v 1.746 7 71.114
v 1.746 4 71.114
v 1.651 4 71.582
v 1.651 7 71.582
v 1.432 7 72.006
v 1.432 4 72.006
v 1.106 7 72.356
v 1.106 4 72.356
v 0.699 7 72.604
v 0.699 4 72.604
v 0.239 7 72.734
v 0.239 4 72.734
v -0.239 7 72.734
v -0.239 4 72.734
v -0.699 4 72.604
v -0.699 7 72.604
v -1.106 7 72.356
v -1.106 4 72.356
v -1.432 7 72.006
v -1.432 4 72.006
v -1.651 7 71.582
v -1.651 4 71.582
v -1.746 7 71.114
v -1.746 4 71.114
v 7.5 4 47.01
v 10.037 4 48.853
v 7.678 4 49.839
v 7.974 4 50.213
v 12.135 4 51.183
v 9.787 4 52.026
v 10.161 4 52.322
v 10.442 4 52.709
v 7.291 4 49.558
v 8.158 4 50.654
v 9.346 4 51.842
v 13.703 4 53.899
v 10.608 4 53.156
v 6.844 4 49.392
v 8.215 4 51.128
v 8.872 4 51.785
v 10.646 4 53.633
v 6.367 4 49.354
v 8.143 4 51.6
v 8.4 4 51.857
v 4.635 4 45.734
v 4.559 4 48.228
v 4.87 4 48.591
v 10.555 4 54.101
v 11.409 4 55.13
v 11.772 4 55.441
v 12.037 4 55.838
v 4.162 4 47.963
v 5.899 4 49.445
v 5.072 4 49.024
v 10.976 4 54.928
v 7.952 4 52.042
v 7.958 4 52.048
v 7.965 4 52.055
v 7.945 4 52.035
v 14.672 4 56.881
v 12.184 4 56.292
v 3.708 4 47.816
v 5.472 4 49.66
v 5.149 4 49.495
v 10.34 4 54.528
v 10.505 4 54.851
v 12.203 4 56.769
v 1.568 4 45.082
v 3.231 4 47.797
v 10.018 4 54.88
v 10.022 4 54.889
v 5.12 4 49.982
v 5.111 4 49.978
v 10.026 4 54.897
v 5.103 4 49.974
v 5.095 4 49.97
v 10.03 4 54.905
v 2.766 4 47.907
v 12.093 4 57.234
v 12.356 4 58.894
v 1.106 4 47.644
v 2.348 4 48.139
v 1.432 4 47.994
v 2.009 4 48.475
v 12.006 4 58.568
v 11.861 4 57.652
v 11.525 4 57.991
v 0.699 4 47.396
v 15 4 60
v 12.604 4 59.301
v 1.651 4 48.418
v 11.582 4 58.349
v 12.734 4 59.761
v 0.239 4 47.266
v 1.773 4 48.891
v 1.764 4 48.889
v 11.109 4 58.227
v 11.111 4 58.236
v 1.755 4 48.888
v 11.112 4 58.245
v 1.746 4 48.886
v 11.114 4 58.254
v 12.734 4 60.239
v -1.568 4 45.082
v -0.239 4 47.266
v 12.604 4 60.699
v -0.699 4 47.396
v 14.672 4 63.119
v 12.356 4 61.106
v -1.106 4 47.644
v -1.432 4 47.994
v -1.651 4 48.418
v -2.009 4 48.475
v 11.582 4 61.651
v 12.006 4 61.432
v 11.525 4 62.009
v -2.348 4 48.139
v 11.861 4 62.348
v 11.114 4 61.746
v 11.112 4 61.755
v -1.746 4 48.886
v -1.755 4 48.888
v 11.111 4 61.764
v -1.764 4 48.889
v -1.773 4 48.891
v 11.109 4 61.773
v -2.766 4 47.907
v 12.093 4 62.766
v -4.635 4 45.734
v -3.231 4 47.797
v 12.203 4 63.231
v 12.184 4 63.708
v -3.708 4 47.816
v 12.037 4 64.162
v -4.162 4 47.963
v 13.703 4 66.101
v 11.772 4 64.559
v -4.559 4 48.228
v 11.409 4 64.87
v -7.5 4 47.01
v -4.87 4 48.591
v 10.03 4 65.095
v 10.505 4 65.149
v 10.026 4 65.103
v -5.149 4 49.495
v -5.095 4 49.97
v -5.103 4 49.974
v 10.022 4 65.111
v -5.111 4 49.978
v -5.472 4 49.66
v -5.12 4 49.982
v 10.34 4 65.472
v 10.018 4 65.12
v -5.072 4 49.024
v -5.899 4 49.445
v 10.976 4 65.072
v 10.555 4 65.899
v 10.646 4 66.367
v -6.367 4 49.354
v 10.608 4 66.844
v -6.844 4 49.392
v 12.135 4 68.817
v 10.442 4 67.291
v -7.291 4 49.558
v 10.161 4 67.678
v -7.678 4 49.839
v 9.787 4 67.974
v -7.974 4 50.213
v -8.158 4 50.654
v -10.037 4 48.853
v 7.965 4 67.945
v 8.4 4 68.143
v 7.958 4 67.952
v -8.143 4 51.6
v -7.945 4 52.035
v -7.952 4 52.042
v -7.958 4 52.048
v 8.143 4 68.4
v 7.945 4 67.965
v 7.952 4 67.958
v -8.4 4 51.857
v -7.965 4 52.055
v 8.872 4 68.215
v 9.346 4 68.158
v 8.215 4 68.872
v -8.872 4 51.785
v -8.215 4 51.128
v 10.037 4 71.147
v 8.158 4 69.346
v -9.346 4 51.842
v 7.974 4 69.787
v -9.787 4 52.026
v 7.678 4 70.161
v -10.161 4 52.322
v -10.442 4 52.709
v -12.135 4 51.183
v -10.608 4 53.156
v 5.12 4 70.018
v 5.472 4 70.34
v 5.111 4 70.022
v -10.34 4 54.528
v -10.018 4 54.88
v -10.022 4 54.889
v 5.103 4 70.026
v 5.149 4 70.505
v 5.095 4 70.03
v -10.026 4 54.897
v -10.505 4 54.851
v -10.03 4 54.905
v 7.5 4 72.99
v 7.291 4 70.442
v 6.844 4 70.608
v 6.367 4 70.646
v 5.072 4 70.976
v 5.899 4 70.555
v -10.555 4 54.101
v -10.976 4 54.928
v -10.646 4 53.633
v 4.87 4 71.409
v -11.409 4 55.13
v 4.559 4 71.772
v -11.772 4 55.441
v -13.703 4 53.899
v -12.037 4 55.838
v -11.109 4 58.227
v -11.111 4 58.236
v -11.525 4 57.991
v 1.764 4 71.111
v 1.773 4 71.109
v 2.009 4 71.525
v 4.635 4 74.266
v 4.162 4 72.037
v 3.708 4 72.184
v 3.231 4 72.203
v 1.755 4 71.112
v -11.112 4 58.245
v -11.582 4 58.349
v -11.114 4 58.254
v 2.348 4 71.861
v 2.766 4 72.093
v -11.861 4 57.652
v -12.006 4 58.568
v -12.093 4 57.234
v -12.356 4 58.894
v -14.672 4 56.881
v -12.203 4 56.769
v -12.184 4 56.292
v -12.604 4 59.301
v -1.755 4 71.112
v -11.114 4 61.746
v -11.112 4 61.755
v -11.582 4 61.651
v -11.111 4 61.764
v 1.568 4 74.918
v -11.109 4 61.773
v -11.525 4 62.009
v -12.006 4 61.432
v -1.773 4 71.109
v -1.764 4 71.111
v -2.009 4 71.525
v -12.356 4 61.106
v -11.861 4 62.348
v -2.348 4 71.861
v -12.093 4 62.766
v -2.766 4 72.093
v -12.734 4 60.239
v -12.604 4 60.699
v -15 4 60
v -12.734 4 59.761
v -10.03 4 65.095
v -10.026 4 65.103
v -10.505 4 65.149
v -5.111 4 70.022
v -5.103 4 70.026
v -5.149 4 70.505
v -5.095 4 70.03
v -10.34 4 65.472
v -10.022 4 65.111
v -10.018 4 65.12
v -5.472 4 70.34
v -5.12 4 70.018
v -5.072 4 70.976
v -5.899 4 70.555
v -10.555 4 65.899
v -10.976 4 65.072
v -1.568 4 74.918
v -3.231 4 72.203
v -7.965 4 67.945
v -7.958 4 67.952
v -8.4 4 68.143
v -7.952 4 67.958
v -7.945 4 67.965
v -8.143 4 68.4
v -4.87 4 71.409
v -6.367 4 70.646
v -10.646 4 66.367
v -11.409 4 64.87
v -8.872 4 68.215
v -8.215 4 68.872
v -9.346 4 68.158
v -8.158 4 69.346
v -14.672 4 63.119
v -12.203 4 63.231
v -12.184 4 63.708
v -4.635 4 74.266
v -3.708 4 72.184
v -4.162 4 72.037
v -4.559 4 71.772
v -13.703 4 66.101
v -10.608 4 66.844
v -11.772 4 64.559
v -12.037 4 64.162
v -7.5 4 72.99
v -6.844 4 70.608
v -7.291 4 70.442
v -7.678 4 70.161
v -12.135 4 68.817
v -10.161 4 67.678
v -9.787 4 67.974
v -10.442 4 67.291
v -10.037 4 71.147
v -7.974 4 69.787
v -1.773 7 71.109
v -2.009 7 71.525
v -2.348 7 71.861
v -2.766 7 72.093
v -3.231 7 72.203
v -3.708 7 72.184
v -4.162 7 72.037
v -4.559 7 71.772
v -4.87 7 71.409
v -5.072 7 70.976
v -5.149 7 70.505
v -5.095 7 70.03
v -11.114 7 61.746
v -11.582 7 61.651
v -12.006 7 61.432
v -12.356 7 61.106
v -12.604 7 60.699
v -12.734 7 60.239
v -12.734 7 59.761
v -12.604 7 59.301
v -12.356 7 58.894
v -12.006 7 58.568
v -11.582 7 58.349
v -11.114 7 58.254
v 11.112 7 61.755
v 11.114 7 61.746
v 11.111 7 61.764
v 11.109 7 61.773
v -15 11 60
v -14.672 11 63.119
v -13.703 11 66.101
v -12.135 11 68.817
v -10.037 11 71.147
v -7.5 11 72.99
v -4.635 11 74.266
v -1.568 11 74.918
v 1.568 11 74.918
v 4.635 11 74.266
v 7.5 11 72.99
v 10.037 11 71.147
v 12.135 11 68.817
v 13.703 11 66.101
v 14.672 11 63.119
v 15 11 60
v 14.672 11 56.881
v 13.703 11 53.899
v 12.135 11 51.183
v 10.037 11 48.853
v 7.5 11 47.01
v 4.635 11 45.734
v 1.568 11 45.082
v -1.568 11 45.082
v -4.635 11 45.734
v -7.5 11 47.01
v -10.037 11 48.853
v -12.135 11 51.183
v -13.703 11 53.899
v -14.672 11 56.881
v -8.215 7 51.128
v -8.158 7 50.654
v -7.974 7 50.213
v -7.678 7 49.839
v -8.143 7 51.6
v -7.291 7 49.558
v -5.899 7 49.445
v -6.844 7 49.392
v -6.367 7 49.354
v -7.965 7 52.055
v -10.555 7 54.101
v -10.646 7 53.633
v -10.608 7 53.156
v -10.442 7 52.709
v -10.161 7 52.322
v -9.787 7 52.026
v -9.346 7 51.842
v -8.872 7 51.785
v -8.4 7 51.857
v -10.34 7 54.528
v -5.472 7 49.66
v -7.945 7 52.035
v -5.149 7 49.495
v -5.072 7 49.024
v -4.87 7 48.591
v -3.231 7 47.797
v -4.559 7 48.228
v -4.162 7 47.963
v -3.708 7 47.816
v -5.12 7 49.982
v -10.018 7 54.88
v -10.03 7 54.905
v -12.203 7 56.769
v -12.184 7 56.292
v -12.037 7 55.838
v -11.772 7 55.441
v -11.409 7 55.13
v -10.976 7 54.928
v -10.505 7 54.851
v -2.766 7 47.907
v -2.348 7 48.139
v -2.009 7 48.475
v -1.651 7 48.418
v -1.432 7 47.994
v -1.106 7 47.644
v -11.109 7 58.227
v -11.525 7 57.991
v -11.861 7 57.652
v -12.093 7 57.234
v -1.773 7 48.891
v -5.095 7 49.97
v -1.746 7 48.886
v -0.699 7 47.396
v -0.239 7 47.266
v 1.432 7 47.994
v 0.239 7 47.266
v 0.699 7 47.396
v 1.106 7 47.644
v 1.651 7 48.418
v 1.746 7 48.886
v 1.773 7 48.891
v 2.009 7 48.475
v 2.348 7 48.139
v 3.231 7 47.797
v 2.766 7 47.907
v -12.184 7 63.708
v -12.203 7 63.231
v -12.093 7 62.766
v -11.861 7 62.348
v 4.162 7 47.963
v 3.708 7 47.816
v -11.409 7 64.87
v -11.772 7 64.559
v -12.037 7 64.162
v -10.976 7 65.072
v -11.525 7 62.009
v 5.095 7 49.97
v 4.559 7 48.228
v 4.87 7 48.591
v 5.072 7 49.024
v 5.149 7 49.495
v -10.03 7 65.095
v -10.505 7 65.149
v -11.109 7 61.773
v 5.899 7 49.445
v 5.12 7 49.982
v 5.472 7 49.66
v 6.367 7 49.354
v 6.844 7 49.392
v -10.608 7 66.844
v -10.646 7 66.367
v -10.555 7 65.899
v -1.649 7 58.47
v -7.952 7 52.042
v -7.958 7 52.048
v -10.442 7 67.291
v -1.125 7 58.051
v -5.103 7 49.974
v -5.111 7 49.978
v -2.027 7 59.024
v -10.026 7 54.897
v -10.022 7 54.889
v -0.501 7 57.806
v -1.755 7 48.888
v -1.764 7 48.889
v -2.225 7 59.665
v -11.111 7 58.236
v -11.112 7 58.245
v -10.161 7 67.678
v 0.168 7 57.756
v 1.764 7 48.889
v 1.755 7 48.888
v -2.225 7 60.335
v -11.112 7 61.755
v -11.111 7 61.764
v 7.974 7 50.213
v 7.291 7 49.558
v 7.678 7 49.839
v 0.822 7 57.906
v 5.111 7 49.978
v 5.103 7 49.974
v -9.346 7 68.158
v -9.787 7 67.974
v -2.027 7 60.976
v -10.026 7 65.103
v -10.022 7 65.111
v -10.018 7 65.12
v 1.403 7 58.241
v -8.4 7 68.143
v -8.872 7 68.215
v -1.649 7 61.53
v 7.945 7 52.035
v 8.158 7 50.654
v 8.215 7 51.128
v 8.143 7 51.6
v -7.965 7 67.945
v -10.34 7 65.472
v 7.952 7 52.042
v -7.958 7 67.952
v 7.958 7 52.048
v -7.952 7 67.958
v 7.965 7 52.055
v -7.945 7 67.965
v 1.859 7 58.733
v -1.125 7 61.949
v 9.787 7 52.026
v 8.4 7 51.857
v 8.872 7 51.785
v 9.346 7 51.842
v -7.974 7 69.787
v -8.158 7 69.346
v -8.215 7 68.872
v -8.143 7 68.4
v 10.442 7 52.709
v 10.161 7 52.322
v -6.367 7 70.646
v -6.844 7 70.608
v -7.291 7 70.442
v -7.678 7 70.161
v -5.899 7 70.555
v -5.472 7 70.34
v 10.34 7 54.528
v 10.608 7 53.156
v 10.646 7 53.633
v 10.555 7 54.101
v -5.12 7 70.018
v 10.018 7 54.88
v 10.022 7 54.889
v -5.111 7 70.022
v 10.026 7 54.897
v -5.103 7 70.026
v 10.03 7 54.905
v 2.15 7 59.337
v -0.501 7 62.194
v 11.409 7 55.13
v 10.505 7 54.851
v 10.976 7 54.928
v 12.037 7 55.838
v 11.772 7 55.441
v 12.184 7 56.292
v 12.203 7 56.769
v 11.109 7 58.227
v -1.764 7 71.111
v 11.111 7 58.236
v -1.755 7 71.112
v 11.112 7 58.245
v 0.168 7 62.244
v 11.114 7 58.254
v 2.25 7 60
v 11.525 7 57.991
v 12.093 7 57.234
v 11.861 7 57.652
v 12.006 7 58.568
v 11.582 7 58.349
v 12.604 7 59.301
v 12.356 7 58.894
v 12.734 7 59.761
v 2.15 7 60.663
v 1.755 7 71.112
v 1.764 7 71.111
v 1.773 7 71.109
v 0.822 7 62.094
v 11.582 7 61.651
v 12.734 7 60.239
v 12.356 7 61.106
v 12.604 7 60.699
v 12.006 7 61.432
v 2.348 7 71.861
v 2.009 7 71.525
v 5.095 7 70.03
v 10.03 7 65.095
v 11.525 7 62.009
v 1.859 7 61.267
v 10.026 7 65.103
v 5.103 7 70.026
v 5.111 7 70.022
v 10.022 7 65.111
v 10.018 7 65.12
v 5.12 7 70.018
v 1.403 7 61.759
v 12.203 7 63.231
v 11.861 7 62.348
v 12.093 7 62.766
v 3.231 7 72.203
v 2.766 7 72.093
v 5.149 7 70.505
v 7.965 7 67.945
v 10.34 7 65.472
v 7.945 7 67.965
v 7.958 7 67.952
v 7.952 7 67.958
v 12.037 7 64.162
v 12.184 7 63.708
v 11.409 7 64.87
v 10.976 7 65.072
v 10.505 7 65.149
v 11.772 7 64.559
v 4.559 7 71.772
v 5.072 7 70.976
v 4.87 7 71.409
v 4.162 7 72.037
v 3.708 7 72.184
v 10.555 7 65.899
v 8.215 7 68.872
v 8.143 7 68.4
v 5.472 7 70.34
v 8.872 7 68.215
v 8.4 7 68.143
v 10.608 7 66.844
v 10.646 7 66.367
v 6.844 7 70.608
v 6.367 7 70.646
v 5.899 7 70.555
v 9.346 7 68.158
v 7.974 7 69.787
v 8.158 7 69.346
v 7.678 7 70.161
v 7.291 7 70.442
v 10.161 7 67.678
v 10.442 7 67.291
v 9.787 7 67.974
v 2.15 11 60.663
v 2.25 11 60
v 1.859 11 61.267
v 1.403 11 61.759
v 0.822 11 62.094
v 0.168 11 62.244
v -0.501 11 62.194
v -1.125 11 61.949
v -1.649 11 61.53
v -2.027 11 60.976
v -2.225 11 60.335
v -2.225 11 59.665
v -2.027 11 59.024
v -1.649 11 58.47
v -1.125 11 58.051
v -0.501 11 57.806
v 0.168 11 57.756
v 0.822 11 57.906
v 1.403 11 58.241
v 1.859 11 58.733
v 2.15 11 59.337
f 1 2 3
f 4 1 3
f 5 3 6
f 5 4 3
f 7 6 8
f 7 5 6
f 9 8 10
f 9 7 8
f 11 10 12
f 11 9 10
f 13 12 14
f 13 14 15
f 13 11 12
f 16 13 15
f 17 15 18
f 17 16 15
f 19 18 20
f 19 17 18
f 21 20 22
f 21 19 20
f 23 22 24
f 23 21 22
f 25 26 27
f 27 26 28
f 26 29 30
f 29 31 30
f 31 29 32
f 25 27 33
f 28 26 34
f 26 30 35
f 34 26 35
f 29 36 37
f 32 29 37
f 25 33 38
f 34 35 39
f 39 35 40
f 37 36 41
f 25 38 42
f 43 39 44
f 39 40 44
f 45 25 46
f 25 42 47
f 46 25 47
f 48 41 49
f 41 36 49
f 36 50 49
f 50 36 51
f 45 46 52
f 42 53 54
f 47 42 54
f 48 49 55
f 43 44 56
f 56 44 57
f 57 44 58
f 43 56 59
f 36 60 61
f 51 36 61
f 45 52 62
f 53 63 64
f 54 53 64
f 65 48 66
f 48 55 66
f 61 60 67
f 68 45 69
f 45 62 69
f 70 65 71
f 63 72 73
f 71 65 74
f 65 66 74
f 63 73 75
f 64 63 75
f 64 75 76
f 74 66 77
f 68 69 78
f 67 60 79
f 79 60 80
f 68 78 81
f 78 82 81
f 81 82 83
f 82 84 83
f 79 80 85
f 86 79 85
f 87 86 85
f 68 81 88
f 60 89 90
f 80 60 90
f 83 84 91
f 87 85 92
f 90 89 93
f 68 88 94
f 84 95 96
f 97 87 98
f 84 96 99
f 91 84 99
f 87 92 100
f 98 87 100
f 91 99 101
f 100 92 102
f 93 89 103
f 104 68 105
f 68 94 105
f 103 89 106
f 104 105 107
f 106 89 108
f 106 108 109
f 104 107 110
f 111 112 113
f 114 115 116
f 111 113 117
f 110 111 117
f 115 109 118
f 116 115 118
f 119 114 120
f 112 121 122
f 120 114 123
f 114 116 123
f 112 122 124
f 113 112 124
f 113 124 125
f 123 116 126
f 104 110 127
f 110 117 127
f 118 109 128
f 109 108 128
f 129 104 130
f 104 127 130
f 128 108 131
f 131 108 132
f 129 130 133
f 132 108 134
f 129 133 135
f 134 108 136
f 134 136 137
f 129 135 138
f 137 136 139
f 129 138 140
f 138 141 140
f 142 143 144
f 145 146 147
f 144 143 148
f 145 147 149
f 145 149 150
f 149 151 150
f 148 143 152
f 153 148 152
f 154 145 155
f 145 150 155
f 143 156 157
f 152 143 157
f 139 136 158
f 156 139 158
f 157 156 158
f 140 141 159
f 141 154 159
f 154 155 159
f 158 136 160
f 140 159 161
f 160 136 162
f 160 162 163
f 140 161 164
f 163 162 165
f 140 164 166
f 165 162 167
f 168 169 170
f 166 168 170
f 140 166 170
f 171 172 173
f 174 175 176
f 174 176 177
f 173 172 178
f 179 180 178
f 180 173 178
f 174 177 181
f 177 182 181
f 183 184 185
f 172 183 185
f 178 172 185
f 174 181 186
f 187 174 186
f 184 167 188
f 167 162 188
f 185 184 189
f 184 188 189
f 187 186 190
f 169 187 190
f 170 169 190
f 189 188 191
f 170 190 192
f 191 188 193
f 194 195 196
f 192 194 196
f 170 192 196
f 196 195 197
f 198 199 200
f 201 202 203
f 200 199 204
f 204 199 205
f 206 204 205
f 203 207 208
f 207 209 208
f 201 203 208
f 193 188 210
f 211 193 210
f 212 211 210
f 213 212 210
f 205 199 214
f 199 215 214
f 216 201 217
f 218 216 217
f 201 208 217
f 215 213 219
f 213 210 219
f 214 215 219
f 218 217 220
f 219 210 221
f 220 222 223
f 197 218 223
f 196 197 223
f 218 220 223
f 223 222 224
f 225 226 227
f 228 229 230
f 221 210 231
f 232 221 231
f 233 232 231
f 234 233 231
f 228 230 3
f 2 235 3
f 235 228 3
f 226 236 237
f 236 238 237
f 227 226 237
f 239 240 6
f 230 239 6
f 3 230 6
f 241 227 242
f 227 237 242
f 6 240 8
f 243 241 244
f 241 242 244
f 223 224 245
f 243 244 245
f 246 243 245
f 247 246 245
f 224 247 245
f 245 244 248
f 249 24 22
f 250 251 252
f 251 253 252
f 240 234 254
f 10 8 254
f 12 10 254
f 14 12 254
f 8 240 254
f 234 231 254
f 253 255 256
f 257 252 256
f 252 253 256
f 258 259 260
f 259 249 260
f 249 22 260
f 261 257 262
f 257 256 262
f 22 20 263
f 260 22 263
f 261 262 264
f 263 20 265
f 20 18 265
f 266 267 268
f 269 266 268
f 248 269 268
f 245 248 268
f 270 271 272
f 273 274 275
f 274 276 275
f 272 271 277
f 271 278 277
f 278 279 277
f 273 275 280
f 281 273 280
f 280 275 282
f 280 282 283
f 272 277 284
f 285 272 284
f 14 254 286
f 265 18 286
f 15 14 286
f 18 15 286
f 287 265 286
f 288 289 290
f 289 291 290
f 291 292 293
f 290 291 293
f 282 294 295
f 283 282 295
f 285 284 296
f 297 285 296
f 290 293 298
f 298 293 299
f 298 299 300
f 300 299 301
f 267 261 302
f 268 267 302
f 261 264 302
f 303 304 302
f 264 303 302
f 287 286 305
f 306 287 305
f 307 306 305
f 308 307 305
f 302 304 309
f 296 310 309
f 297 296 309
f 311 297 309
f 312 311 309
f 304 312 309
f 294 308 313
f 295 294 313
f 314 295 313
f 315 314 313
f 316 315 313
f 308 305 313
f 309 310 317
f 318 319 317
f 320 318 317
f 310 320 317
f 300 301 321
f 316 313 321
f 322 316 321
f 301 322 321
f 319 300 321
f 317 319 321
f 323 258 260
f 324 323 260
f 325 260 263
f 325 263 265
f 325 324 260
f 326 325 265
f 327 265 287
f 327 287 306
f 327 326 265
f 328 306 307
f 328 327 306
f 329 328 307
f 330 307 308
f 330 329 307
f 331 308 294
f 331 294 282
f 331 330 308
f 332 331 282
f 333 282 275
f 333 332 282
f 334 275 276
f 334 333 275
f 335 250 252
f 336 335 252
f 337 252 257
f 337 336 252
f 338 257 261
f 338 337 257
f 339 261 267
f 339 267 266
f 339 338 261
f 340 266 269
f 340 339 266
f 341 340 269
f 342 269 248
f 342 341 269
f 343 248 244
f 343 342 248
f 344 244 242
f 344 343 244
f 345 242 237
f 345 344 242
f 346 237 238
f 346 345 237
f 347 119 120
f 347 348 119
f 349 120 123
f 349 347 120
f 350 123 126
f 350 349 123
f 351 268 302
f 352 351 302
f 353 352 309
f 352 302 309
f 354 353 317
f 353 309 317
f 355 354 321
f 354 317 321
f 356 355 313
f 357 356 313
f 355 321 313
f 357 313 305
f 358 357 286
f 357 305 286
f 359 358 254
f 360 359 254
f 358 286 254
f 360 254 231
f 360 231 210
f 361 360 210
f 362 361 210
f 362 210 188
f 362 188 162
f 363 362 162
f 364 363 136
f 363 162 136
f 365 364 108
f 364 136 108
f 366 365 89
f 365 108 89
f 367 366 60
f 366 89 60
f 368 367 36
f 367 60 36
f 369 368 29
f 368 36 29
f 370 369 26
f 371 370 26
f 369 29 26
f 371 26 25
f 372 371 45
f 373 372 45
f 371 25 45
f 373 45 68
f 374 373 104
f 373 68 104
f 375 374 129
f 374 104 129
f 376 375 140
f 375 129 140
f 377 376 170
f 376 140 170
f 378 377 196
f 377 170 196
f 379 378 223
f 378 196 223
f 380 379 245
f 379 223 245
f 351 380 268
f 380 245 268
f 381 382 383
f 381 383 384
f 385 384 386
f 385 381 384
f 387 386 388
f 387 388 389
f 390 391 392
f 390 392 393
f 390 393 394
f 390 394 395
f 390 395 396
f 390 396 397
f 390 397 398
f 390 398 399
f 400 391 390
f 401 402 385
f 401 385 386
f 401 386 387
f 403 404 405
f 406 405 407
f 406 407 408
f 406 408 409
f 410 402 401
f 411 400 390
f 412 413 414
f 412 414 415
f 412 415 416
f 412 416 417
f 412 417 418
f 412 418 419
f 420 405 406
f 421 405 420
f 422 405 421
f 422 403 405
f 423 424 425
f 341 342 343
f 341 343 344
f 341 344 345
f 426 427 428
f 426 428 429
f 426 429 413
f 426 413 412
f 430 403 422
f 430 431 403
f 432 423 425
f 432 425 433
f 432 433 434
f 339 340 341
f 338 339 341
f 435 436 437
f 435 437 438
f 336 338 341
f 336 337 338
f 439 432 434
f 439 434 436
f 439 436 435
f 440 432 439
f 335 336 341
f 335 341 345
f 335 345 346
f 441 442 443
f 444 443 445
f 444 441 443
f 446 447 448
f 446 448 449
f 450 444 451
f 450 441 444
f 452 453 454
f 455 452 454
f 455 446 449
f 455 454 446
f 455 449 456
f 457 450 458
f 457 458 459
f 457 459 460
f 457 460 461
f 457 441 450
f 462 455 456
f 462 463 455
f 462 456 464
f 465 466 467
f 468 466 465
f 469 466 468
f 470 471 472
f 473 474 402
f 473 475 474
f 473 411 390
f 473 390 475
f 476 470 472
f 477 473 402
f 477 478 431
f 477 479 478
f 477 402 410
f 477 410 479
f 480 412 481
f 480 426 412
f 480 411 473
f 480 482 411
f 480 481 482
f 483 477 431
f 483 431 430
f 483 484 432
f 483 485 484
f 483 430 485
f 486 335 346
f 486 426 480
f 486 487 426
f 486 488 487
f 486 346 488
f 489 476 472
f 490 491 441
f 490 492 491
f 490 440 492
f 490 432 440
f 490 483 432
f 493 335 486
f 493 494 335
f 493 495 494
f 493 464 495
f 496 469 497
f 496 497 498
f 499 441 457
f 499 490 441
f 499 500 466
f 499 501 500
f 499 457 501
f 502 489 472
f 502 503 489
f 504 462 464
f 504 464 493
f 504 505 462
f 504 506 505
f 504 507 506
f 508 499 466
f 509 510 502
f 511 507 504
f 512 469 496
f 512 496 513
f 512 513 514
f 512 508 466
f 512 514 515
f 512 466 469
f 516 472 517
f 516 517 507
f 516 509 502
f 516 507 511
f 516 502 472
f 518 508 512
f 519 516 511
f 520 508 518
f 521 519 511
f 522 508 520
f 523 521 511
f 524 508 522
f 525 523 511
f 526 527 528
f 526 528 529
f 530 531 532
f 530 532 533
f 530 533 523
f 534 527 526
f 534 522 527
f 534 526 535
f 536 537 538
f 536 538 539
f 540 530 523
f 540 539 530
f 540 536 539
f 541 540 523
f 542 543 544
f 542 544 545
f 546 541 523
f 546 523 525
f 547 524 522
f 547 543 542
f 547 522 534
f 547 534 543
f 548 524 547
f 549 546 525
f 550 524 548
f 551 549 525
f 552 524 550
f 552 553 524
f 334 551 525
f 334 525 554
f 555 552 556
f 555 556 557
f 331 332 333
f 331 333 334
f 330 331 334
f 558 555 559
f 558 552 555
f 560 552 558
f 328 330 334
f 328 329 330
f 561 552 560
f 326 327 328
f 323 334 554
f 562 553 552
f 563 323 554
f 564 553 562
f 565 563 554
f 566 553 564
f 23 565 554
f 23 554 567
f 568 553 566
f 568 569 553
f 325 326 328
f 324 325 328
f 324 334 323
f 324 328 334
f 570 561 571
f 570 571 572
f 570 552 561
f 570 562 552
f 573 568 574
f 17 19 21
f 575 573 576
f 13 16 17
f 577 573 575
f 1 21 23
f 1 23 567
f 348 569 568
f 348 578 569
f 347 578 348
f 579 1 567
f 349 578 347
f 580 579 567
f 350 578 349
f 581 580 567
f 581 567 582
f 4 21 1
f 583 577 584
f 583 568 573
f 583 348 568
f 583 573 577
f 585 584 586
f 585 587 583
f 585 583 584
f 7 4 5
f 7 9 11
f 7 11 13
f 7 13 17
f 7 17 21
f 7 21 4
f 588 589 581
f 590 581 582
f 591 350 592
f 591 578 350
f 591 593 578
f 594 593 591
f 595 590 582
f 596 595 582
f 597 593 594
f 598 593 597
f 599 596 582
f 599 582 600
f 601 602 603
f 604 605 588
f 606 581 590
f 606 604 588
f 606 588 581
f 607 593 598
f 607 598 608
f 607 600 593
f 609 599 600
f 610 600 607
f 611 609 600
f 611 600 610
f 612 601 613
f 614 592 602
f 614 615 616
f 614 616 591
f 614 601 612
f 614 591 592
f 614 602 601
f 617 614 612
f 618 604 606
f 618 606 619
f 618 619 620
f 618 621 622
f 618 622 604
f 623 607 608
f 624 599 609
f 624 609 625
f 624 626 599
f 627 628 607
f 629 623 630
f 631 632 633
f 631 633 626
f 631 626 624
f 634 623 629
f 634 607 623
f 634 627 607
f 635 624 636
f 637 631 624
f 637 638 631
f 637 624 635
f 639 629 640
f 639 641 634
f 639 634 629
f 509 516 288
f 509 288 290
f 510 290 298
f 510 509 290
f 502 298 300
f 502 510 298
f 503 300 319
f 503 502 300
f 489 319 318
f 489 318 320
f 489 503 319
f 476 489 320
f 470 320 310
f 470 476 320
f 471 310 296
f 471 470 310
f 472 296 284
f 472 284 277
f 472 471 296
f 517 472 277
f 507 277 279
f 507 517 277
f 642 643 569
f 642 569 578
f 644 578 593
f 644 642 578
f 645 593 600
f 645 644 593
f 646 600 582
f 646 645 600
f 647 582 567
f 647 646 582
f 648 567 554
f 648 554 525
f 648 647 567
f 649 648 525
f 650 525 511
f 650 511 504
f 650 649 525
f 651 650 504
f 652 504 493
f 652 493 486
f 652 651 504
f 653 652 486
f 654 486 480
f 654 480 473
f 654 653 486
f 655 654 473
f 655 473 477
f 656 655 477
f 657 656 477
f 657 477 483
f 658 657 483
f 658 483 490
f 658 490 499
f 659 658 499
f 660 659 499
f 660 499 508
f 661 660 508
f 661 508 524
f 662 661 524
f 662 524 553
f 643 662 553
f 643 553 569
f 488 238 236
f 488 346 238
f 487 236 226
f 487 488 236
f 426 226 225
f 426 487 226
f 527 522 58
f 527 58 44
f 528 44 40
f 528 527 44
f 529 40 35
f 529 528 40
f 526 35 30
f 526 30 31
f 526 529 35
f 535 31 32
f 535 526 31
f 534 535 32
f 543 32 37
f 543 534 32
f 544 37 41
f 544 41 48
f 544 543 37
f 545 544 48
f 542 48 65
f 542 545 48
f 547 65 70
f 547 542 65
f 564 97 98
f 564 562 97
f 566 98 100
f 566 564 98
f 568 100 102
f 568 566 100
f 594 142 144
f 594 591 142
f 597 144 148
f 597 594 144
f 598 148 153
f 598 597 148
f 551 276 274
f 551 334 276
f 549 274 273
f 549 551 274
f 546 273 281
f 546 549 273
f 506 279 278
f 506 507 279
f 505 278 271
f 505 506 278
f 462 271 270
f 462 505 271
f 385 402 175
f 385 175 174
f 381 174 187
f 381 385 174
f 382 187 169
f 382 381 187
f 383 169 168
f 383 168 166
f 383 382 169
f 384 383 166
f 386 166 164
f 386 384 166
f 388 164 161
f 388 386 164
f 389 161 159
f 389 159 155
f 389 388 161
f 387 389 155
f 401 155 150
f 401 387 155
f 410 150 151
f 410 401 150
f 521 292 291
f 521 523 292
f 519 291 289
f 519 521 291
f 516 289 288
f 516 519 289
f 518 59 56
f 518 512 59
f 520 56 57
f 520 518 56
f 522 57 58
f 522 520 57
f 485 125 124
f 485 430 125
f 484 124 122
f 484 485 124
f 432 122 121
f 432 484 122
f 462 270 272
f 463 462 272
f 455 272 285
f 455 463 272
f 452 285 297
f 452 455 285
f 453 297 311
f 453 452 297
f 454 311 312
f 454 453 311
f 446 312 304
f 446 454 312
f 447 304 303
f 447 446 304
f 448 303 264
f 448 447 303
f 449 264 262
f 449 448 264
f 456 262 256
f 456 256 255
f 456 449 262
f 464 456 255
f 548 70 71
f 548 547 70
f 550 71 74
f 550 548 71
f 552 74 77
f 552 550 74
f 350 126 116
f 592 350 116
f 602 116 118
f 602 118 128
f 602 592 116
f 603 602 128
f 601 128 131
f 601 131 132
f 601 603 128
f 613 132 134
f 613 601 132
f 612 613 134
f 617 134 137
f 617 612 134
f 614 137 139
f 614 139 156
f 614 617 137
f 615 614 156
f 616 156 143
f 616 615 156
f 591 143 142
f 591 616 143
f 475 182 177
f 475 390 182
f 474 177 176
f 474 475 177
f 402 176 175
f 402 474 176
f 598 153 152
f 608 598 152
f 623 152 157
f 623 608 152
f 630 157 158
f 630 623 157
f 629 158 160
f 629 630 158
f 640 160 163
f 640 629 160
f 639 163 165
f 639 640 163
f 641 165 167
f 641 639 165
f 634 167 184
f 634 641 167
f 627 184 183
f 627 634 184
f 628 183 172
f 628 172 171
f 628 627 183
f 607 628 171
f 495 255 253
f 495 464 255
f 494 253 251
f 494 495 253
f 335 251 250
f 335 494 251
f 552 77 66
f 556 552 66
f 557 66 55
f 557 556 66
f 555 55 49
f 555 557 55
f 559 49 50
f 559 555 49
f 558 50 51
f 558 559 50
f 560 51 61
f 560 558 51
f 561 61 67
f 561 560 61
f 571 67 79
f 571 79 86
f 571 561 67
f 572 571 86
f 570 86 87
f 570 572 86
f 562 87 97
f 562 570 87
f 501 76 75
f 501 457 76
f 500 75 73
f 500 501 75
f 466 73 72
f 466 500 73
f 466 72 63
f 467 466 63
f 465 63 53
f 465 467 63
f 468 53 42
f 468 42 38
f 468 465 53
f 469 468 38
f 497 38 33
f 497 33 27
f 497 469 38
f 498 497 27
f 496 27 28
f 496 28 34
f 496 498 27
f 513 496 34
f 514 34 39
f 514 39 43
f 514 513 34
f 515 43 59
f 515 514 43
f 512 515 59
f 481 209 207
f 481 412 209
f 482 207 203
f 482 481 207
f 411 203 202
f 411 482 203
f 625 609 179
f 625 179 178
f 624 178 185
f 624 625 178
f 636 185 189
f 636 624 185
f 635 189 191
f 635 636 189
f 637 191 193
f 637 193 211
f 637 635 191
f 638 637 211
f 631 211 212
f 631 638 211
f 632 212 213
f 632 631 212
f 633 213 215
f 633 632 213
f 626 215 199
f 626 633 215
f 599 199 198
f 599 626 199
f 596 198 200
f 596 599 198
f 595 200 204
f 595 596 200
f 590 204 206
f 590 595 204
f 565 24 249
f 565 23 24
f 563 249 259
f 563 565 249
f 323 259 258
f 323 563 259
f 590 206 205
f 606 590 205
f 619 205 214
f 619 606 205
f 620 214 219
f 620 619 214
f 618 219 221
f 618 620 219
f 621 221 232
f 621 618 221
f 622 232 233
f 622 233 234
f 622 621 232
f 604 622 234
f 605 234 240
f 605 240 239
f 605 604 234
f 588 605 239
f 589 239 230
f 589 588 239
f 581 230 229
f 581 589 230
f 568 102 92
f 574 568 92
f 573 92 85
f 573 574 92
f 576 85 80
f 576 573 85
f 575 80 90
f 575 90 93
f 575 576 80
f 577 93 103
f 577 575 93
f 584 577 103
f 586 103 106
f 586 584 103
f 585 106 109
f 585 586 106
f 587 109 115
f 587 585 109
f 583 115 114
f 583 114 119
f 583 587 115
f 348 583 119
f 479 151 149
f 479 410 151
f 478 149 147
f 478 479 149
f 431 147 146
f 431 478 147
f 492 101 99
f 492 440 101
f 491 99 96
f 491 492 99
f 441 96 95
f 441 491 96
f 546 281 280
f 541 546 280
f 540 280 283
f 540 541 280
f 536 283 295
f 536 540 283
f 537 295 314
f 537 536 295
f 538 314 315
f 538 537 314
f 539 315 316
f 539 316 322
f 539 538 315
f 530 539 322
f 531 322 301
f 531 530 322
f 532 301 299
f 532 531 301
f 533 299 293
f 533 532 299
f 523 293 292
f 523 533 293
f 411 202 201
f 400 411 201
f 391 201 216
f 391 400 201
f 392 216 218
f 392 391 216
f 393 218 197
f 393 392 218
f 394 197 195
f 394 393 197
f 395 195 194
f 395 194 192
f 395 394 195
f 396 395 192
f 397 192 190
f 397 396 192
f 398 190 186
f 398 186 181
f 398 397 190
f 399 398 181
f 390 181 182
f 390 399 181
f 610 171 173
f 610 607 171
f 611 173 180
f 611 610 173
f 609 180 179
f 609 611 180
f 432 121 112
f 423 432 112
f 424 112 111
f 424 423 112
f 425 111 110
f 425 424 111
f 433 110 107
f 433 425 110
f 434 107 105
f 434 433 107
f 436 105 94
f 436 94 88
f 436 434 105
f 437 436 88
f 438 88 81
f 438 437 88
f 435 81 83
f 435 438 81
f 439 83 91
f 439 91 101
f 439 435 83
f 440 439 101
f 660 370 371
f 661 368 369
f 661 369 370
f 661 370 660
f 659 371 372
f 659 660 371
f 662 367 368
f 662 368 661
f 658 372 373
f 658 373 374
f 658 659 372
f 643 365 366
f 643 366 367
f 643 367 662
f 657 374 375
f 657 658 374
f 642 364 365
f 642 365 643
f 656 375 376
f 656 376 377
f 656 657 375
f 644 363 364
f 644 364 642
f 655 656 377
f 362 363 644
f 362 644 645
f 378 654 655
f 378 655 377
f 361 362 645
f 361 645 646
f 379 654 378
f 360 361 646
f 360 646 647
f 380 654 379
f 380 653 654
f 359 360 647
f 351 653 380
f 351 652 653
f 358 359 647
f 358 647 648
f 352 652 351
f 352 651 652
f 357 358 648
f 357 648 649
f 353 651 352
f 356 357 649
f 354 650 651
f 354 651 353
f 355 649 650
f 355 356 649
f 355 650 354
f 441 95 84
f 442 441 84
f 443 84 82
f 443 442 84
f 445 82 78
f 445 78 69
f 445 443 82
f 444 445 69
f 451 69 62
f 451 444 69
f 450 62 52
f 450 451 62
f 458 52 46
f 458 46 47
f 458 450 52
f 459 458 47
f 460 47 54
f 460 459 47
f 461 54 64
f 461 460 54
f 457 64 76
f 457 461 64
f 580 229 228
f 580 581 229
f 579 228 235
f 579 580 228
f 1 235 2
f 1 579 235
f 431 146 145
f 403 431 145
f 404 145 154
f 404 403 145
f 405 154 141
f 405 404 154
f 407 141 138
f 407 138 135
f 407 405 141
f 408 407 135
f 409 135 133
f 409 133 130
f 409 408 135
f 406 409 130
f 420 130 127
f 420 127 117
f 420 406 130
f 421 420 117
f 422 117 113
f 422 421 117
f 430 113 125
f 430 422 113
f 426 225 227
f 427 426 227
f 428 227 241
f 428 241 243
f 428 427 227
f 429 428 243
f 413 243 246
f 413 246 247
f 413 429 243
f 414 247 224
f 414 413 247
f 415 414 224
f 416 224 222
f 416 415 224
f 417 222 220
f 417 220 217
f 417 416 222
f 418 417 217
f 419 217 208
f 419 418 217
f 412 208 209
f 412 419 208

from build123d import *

# Parameters (mm, degrees)
CYLINDER043_R           = 15
CYLINDER043_DEPTH       = 7
CYLINDER044_R           = 11.25
CYLINDER044_DEPTH       = 3
CYLINDER045_R           = 1.75
CYLINDER045_DEPTH       = 3
POLARPATTERN009_COUNT   = 20
CYLINDER048_R           = 2.25
CYLINDER048_DEPTH       = 7
BODY019_PLACEMENT_ANGLE = 90


with BuildPart() as part:
    # Cylinder043 → Cylinder043 (join)
    with BuildSketch(Plane(origin=(0, 0, 3), x_dir=(-1, 0, 0), z_dir=(0, 0, -1))):
        Circle(CYLINDER043_R)
    extrude(amount=CYLINDER043_DEPTH)

    # Cylinder044 → Cylinder044 (cut)
    with BuildSketch(Plane.XY):
        Circle(CYLINDER044_R)
    extrude(amount=CYLINDER044_DEPTH, mode=Mode.SUBTRACT)

    # Cylinder045 → Cylinder045 (cut)
    with BuildSketch(Plane(origin=(0, 11, 0), x_dir=(1, 0, 0), z_dir=(0, 0, 1))):
        Circle(CYLINDER045_R)
    cylinder045 = extrude(amount=CYLINDER045_DEPTH, mode=Mode.SUBTRACT)

    # PolarPattern009: Cylinder045 ×20 about axis
    polarpattern009_axis = Axis((0, 0, 0), (0, 0, 1))
    for i in range(1, POLARPATTERN009_COUNT):
        add(cylinder045.rotate(polarpattern009_axis, i * 360 / POLARPATTERN009_COUNT), mode=Mode.SUBTRACT)

    # Cylinder048 → Cylinder048 (cut)
    with BuildSketch(Plane.XY.offset(-7)):
        Circle(CYLINDER048_R)
    extrude(amount=CYLINDER048_DEPTH, mode=Mode.SUBTRACT)


with BuildPart() as part_1:
    # Body019 placement: moved
    add(part.part.moved(Location((0, 7, 60))).rotate(Axis((0, 7, 60), (1, 0, 0)), BODY019_PLACEMENT_ANGLE))


solid = part_1.part
